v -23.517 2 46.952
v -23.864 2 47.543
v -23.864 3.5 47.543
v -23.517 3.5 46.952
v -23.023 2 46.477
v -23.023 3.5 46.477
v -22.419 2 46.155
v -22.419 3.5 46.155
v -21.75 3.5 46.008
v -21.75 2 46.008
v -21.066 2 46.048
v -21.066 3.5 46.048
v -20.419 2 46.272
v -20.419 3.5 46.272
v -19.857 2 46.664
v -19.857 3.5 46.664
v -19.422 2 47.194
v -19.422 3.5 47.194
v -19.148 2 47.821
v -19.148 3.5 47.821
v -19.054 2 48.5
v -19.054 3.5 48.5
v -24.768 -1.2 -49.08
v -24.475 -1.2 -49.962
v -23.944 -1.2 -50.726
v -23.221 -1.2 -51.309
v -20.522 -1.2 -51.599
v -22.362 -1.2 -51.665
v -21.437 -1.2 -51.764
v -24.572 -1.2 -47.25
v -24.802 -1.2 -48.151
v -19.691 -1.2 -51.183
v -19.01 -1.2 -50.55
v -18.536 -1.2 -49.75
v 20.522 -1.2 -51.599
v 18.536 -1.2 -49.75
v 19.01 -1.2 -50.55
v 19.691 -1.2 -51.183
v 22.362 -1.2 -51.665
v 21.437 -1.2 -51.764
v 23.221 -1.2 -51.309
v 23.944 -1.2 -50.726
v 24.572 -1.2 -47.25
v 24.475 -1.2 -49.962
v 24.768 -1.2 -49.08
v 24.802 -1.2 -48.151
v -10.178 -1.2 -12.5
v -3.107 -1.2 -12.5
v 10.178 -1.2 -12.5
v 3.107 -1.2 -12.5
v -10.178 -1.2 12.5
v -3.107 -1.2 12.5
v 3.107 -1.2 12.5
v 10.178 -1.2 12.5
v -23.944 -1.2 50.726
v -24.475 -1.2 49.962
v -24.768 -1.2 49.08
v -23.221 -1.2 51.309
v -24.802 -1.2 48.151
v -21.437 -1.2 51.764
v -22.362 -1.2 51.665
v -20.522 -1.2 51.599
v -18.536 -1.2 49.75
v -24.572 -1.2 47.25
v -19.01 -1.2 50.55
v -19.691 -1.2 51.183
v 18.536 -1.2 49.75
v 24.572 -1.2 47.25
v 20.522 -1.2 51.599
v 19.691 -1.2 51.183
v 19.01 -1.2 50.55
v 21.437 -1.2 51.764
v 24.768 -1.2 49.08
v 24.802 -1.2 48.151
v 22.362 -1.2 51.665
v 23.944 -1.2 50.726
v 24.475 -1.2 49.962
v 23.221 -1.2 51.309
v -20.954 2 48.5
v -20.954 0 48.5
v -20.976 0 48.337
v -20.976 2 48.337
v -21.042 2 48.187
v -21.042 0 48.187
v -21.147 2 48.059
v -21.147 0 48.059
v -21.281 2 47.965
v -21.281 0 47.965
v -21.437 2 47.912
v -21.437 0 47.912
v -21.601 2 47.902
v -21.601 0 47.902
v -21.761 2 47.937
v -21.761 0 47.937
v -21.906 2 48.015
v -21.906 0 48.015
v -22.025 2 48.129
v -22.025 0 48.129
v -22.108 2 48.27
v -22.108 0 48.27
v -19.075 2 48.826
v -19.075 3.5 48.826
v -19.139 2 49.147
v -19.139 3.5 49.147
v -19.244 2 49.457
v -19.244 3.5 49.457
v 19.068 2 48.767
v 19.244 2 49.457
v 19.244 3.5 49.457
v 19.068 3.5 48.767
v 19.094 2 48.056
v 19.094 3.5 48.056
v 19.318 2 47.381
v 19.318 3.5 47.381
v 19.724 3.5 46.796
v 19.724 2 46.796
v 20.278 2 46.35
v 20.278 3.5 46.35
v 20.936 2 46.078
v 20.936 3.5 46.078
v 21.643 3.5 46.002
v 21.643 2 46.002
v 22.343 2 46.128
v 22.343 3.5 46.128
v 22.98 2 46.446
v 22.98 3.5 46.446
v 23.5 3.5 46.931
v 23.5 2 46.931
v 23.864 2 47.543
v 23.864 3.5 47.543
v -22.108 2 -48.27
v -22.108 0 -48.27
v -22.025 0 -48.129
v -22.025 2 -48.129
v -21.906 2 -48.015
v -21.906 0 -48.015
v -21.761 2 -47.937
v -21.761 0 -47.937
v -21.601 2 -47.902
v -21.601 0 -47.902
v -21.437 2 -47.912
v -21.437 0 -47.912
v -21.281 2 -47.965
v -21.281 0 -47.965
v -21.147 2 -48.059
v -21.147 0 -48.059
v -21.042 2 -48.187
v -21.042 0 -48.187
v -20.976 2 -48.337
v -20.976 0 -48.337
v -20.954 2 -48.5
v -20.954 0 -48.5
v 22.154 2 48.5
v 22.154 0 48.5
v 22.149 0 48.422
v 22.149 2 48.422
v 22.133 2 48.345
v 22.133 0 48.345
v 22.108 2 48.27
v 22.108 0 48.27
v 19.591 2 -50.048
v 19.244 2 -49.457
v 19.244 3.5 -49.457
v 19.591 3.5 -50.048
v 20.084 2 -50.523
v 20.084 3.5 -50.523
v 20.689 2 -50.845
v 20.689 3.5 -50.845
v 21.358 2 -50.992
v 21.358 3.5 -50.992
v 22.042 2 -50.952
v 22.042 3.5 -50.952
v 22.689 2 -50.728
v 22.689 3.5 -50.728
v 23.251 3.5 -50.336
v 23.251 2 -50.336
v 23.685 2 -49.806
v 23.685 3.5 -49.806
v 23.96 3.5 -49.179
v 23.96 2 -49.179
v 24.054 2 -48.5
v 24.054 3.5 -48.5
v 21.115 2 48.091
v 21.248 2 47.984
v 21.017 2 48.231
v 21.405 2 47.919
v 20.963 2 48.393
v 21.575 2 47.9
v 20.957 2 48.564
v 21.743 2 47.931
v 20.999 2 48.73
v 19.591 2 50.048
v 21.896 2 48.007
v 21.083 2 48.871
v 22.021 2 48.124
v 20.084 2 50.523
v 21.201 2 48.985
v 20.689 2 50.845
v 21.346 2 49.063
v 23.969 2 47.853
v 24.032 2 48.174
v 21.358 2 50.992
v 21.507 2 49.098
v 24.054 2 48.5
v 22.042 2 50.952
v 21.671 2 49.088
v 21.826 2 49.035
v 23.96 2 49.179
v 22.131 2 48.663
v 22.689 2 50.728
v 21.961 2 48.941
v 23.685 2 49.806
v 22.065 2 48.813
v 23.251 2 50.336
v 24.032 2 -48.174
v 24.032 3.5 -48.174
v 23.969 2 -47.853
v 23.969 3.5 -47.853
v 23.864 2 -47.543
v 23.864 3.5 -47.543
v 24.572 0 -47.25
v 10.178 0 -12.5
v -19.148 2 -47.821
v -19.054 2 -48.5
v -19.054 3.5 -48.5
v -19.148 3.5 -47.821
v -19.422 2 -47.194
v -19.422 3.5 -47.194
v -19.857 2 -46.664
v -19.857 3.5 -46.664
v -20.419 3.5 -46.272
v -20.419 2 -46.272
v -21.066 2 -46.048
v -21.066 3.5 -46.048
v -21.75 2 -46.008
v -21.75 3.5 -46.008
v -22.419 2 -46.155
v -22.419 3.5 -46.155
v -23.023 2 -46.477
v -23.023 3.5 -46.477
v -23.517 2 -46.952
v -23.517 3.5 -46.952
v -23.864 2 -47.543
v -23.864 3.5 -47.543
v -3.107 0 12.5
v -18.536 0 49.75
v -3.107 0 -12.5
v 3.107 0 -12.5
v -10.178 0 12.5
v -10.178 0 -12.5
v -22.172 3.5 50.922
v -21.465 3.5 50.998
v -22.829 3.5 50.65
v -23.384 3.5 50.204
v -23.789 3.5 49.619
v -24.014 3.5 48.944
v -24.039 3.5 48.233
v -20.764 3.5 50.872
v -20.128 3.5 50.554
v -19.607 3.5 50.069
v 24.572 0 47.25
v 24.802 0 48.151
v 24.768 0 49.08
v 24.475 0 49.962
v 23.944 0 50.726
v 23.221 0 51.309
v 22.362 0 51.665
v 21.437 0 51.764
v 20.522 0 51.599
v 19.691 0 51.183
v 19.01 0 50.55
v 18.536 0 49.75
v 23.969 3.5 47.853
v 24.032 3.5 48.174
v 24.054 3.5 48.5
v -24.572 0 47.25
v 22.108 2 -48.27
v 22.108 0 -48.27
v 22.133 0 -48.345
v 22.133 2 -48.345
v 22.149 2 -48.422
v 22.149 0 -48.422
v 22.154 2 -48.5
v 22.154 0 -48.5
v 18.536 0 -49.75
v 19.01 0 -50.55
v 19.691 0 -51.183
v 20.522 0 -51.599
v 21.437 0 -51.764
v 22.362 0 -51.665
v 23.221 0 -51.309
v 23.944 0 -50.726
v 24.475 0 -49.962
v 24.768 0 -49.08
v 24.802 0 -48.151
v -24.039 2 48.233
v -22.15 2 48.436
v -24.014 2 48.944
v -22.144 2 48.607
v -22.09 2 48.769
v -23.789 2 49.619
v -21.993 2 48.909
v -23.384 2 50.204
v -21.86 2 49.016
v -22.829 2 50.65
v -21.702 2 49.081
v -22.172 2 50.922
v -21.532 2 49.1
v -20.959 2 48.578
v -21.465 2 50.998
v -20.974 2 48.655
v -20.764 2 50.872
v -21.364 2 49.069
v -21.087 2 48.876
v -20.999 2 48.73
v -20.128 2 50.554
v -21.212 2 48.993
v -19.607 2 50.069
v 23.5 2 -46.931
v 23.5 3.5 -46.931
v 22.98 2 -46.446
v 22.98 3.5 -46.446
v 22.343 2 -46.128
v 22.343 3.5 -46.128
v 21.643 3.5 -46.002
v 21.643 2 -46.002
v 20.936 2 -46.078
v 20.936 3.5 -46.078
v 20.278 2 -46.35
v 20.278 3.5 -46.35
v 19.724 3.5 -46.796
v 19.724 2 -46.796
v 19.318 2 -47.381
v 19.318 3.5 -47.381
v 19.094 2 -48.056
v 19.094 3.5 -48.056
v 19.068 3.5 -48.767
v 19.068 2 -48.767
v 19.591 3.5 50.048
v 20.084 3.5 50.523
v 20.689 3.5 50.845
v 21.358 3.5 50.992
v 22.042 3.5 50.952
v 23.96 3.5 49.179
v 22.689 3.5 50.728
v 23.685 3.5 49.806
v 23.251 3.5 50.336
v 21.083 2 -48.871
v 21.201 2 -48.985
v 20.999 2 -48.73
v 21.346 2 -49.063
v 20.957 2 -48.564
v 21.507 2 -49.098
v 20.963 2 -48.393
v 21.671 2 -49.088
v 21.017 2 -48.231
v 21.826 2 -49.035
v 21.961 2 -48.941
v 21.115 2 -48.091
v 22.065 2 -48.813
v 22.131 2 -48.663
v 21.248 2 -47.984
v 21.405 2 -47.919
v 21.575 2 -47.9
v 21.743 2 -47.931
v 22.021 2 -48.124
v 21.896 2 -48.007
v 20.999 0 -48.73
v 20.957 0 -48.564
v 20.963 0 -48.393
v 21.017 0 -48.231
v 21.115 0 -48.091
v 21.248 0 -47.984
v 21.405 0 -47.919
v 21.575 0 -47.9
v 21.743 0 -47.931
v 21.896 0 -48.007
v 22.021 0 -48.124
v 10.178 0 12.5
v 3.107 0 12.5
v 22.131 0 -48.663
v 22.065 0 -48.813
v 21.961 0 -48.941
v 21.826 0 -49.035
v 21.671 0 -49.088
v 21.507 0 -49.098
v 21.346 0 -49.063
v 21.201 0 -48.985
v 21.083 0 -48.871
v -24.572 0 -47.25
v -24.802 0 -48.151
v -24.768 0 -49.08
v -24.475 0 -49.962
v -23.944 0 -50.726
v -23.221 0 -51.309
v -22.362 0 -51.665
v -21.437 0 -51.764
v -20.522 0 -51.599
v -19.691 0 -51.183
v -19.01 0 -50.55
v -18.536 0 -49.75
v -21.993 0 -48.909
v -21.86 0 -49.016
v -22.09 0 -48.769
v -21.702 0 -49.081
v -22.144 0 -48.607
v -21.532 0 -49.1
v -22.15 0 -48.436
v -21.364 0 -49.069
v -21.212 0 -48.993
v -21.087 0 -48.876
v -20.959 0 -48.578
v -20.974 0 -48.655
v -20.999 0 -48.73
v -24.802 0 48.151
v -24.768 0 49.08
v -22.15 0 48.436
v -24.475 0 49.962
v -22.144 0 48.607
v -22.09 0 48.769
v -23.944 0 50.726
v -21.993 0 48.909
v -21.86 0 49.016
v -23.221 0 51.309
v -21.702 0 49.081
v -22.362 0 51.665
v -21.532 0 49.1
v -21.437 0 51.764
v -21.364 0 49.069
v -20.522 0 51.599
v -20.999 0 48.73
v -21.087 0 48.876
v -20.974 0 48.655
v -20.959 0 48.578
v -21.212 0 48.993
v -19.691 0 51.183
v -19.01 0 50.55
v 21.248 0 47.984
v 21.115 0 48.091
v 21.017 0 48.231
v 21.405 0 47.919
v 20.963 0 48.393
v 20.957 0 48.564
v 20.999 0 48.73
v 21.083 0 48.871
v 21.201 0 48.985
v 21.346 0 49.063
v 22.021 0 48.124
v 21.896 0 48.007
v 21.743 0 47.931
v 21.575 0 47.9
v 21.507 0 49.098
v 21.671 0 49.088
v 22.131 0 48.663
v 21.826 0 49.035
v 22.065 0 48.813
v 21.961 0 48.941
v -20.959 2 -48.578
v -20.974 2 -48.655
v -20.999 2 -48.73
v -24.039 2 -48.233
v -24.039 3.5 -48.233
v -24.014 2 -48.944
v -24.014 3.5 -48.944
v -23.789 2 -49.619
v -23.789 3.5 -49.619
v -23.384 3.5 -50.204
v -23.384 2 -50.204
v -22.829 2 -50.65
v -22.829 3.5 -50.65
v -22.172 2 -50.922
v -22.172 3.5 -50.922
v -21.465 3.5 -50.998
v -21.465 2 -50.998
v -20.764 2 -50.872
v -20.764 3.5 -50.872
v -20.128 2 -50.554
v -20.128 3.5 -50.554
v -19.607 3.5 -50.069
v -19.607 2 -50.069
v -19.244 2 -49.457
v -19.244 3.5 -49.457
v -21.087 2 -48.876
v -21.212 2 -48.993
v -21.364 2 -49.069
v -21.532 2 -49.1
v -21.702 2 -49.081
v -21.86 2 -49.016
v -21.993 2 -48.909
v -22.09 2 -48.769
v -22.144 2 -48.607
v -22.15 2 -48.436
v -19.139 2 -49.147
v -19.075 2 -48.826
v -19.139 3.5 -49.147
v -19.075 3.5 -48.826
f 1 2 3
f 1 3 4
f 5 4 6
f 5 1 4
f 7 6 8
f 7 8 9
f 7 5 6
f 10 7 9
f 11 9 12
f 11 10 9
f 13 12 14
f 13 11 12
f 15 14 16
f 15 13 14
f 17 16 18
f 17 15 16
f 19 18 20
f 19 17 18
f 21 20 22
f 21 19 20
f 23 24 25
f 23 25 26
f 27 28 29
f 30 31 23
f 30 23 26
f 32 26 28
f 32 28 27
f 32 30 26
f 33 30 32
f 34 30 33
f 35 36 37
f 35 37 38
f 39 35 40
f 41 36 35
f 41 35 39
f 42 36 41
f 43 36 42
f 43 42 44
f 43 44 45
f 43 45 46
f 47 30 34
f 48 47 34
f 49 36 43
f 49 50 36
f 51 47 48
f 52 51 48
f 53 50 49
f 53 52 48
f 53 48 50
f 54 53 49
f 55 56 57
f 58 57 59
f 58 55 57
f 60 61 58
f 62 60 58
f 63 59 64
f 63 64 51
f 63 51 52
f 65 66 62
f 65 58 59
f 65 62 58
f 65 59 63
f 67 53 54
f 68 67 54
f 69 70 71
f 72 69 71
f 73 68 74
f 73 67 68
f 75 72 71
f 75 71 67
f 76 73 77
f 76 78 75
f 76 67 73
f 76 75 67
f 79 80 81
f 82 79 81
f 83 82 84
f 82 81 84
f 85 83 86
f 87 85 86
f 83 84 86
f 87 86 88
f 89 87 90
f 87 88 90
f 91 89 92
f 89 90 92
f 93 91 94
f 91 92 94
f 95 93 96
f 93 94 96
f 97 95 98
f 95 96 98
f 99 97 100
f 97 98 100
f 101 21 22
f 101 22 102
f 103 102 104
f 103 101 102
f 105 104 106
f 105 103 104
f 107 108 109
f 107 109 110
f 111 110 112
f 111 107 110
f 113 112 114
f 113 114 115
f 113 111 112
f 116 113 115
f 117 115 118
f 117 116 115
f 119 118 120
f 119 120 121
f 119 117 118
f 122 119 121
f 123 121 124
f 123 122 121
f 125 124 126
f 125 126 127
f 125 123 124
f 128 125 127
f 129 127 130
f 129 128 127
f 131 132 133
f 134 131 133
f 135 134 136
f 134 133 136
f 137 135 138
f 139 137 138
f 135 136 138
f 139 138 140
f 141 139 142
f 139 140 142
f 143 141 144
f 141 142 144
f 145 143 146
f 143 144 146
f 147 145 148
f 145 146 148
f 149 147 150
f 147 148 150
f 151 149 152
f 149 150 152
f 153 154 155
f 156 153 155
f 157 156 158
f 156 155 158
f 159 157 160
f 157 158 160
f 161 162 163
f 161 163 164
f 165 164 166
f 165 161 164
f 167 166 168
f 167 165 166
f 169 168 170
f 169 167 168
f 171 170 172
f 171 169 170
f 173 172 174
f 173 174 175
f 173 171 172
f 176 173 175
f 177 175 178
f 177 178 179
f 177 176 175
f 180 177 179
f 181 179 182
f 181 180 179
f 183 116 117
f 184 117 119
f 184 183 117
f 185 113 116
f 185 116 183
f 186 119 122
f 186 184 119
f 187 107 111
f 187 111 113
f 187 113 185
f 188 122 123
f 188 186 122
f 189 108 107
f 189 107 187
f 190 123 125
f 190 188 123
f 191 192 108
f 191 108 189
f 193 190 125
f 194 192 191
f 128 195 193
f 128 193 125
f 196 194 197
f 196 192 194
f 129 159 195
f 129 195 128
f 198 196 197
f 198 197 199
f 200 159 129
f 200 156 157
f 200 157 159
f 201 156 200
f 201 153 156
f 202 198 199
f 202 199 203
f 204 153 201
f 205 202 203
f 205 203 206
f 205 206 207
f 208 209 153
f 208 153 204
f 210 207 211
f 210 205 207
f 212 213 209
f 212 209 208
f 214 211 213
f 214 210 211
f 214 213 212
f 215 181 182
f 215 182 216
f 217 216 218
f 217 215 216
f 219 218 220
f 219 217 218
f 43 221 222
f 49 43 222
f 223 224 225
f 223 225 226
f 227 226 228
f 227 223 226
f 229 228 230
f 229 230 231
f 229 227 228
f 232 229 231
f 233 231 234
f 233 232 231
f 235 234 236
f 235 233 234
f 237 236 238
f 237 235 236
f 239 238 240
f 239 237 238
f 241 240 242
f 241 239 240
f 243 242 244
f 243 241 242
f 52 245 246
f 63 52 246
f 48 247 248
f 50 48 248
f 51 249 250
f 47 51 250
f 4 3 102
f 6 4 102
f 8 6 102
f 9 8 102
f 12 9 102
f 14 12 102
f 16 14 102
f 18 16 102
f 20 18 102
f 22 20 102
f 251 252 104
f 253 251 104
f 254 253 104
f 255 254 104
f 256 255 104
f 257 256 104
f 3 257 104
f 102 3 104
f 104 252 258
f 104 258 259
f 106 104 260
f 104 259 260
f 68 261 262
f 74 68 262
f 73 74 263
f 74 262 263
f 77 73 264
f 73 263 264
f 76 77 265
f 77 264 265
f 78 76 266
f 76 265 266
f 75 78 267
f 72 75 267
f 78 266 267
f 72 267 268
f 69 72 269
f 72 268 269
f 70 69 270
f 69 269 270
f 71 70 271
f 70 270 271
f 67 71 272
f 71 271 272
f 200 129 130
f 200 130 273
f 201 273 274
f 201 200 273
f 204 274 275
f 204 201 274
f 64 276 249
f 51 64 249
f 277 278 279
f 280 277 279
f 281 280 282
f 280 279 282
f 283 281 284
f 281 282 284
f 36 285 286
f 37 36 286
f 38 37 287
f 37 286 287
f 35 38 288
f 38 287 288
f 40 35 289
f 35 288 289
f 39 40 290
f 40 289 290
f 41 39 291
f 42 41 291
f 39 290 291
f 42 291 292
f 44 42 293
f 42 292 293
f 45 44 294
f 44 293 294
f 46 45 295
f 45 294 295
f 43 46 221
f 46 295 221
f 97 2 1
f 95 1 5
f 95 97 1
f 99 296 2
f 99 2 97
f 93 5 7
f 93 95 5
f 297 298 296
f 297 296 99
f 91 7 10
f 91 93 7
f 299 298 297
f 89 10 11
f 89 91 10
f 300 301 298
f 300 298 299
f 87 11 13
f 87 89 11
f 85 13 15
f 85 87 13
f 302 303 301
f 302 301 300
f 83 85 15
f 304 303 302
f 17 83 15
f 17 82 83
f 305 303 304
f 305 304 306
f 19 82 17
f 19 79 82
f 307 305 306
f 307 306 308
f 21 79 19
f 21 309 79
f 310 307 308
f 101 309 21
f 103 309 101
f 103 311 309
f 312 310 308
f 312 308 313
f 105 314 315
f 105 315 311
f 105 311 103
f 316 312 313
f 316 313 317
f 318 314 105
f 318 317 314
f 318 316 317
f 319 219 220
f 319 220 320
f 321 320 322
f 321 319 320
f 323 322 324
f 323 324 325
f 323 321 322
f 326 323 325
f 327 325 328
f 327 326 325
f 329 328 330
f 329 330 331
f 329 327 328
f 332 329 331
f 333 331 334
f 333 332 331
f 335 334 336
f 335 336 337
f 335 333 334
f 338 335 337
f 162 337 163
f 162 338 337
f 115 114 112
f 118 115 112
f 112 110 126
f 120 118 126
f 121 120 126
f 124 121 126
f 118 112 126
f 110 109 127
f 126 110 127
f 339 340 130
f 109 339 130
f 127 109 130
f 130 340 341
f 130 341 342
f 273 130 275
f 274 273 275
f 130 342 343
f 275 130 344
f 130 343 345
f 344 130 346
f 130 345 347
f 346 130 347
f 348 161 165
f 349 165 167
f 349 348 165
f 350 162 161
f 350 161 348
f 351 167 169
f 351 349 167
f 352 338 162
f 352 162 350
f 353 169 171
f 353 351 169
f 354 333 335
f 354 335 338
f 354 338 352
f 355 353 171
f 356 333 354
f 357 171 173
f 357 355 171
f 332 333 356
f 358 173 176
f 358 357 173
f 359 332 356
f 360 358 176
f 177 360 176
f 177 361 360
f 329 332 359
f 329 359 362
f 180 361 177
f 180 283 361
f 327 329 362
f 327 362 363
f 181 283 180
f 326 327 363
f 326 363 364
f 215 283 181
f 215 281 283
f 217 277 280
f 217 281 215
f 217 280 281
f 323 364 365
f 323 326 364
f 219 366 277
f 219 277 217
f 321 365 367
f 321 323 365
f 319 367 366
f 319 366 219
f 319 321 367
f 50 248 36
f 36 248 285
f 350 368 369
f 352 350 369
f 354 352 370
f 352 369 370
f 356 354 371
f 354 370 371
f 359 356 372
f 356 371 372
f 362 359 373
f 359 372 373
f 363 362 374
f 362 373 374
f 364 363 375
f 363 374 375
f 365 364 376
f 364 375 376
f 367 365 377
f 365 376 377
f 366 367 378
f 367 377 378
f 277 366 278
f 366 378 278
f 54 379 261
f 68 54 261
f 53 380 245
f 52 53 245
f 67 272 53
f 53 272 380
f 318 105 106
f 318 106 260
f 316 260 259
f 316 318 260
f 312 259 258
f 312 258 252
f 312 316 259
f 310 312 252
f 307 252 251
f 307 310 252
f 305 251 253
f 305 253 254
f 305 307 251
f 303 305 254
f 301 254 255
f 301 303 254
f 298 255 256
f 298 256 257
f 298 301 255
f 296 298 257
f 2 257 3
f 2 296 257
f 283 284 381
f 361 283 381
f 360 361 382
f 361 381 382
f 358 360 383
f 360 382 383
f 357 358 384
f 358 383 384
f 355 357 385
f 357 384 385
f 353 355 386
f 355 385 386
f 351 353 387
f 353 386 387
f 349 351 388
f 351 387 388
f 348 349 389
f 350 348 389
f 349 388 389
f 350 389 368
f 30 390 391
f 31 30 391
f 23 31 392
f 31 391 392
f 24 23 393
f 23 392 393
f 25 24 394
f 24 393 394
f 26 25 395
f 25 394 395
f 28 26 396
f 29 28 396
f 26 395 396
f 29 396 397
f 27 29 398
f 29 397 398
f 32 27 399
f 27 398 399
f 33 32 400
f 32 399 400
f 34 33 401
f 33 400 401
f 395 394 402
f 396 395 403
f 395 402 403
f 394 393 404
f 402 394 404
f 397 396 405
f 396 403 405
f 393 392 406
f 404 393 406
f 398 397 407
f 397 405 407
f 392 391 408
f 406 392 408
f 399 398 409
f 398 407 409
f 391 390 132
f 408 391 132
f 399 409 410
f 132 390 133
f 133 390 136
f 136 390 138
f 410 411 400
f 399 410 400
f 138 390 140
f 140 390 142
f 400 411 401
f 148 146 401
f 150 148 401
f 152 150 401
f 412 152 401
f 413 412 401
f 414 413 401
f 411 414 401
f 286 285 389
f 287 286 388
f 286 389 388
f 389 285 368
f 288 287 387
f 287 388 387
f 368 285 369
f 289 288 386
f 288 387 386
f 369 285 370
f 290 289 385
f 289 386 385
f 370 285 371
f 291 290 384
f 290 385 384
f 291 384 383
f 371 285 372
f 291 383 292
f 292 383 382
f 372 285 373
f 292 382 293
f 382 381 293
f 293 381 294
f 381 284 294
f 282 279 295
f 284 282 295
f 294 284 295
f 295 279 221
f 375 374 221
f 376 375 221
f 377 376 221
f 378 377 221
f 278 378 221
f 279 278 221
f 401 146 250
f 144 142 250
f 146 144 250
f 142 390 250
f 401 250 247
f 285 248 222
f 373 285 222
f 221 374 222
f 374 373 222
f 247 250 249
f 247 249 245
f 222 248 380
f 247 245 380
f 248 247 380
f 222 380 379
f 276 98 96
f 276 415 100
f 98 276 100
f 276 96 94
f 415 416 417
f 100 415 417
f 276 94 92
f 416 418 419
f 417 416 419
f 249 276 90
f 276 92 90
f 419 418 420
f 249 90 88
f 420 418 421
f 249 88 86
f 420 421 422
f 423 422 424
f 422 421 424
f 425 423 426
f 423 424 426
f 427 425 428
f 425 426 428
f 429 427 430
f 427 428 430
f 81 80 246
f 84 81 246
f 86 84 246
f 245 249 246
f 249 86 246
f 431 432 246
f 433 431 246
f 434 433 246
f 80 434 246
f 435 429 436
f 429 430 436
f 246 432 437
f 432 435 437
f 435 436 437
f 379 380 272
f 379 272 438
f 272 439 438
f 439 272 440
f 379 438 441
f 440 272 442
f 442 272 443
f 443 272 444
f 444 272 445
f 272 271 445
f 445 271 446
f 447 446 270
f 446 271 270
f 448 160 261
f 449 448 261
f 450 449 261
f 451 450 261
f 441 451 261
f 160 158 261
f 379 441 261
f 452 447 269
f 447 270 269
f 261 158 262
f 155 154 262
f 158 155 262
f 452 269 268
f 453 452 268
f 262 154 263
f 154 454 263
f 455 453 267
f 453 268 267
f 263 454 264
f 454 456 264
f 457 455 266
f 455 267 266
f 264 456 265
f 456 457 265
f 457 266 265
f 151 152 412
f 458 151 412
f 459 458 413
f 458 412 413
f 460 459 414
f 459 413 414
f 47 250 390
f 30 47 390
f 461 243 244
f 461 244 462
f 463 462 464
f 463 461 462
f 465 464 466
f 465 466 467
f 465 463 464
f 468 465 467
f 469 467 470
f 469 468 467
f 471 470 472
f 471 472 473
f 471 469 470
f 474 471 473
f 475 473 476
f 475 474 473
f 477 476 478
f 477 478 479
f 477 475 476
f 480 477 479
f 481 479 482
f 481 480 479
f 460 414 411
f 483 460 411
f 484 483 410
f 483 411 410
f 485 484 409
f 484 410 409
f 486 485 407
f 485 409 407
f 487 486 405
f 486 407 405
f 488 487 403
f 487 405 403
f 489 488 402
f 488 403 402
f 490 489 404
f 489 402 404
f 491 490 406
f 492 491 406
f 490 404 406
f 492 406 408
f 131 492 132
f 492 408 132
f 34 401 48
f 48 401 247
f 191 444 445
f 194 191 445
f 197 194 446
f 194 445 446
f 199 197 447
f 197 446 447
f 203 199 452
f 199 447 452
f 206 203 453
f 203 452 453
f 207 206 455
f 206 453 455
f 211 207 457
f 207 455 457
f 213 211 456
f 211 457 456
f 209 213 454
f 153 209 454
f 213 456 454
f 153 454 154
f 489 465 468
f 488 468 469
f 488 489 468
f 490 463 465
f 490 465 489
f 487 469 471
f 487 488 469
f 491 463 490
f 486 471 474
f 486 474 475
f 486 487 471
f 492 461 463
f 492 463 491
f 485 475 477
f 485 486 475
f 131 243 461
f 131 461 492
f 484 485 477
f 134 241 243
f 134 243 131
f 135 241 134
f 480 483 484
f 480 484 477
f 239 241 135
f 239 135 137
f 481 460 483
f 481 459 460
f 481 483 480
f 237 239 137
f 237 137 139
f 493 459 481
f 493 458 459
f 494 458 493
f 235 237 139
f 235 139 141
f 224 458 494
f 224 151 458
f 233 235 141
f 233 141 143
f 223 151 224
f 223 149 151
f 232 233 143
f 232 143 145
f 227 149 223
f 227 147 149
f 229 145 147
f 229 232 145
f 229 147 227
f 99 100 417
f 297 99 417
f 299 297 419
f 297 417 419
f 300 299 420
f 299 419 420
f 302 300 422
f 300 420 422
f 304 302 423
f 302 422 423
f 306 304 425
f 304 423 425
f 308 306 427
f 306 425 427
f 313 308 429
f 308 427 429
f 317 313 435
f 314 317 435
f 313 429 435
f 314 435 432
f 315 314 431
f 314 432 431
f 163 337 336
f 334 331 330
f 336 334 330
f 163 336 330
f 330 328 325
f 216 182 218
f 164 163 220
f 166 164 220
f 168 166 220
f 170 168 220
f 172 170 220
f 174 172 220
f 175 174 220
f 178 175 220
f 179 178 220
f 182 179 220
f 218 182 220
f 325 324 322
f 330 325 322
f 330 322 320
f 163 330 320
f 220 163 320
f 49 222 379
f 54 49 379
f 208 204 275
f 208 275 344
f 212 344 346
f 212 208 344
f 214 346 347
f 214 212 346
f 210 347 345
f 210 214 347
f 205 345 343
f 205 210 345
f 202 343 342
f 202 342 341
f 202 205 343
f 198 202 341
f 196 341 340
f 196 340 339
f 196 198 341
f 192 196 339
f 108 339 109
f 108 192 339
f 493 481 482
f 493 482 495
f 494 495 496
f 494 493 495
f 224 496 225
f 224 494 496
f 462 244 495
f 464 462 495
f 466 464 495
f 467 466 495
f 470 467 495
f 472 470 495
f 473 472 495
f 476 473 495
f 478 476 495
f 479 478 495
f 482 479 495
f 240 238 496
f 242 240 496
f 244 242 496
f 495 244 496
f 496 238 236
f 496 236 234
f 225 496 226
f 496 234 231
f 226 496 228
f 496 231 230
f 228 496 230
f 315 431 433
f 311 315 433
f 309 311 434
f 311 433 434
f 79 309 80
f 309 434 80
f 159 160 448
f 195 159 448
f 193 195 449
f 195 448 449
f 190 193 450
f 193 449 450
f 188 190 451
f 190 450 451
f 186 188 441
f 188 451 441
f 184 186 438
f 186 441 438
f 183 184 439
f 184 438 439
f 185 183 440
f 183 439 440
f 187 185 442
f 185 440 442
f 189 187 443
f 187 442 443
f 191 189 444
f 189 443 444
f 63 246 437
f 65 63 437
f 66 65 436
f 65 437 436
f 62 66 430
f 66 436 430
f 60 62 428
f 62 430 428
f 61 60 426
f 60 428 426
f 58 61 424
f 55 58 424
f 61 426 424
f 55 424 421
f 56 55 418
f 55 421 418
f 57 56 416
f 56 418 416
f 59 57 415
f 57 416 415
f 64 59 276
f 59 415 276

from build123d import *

# Parameters (mm, degrees)
F1_DEPTH = 1.2
F2_DEPTH = 3.5
F3_DEPTH = 2


with BuildPart() as f1:
    # F0 (on Front) → F1 (new body)
    with BuildSketch(Plane.XZ):
        with BuildLine():
            ThreePointArc((-19.2441250379, 49.4567085809), (-22.5105324501, 50.8096988313), (-23.8635227004, 47.5432914191))
            Line((-23.8635227004, 47.5432914191), (-22.1081515887, 48.2703899406))
            ThreePointArc((-22.1081515887, 48.2703899406), (-21.7834339286, 49.0543277195), (-20.9994961497, 48.7296100594))
            Line((-20.9994961497, 48.7296100594), (-19.2441250379, 49.4567085809))
        make_face()
        with BuildLine():
            Line((-22.1081515887, 48.2703899406), (-23.8635227004, 47.5432914191))
            ThreePointArc((-23.8635227004, 47.5432914191), (-21.0660980641, 46.048036799), (-19.0538238692, 48.5))
            ThreePointArc((-19.0538238692, 48.5), (-19.1018606682, 48.987725805), (-19.2441250379, 49.4567085809))
            Line((-19.2441250379, 49.4567085809), (-20.9994961497, 48.7296100594))
            ThreePointArc((-20.9994961497, 48.7296100594), (-20.9653527009, 48.6170541932), (-20.9538238692, 48.5))
            ThreePointArc((-20.9538238692, 48.5), (-21.436769676, 47.9115288318), (-22.1081515887, 48.2703899406))
        make_face()
        with BuildLine():
            Line((-20.9994961497, 48.7296100594), (-22.1081515887, 48.2703899406))
            ThreePointArc((-22.1081515887, 48.2703899406), (-21.436769676, 47.9115288318), (-20.9538238692, 48.5))
            ThreePointArc((-20.9538238692, 48.5), (-20.9653527009, 48.6170541932), (-20.9994961497, 48.7296100594))
        make_face()
        with BuildLine():
            ThreePointArc((-20.9994961497, 48.7296100594), (-21.7834339286, 49.0543277195), (-22.1081515887, 48.2703899406))
            Line((-22.1081515887, 48.2703899406), (-20.9994961497, 48.7296100594))
        make_face()
        with BuildLine():
            ThreePointArc((22.1538238692, 48.5), (21.6708780624, 49.0884711682), (20.9994961497, 48.7296100594))
            Line((20.9994961497, 48.7296100594), (22.1081515887, 48.2703899406))
            ThreePointArc((22.1081515887, 48.2703899406), (22.1422950374, 48.3829458068), (22.1538238692, 48.5))
        make_face()
        with BuildLine():
            ThreePointArc((24.0538238692, 48.5), (22.0415496742, 50.951963201), (19.2441250379, 49.4567085809))
            Line((19.2441250379, 49.4567085809), (20.9994961497, 48.7296100594))
            ThreePointArc((20.9994961497, 48.7296100594), (21.6708780624, 49.0884711682), (22.1538238692, 48.5))
            ThreePointArc((22.1538238692, 48.5), (22.1422950374, 48.3829458068), (22.1081515887, 48.2703899406))
            Line((22.1081515887, 48.2703899406), (23.8635227004, 47.5432914191))
            ThreePointArc((23.8635227004, 47.5432914191), (24.0057870702, 48.012274195), (24.0538238692, 48.5))
        make_face()
        with BuildLine():
            Line((20.9994961497, 48.7296100594), (19.2441250379, 49.4567085809))
            ThreePointArc((19.2441250379, 49.4567085809), (20.5971152882, 46.1903011687), (23.8635227004, 47.5432914191))
            Line((23.8635227004, 47.5432914191), (22.1081515887, 48.2703899406))
            ThreePointArc((22.1081515887, 48.2703899406), (21.3242138097, 47.9456722805), (20.9994961497, 48.7296100594))
        make_face()
        with BuildLine():
            Line((22.1081515887, 48.2703899406), (20.9994961497, 48.7296100594))
            ThreePointArc((20.9994961497, 48.7296100594), (21.3242138097, 47.9456722805), (22.1081515887, 48.2703899406))
        make_face()
        with BuildLine():
            Line((-22.1081515887, -48.2703899406), (-23.8635227004, -47.5432914191))
            ThreePointArc((-23.8635227004, -47.5432914191), (-22.5105324501, -50.8096988313), (-19.2441250379, -49.4567085809))
            Line((-19.2441250379, -49.4567085809), (-20.9994961497, -48.7296100594))
            ThreePointArc((-20.9994961497, -48.7296100594), (-21.7834339286, -49.0543277195), (-22.1081515887, -48.2703899406))
        make_face()
        with BuildLine():
            Line((-20.9994961497, -48.7296100594), (-22.1081515887, -48.2703899406))
            ThreePointArc((-22.1081515887, -48.2703899406), (-21.7834339286, -49.0543277195), (-20.9994961497, -48.7296100594))
        make_face()
        with BuildLine():
            ThreePointArc((-20.9538238692, -48.5), (-21.436769676, -47.9115288318), (-22.1081515887, -48.2703899406))
            Line((-22.1081515887, -48.2703899406), (-20.9994961497, -48.7296100594))
            ThreePointArc((-20.9994961497, -48.7296100594), (-20.9653527009, -48.6170541932), (-20.9538238692, -48.5))
        make_face()
        with BuildLine():
            ThreePointArc((-19.0538238692, -48.5), (-21.0660980641, -46.048036799), (-23.8635227004, -47.5432914191))
            Line((-23.8635227004, -47.5432914191), (-22.1081515887, -48.2703899406))
            ThreePointArc((-22.1081515887, -48.2703899406), (-21.436769676, -47.9115288318), (-20.9538238692, -48.5))
            ThreePointArc((-20.9538238692, -48.5), (-20.9653527009, -48.6170541932), (-20.9994961497, -48.7296100594))
            Line((-20.9994961497, -48.7296100594), (-19.2441250379, -49.4567085809))
            ThreePointArc((-19.2441250379, -49.4567085809), (-19.1018606682, -48.987725805), (-19.0538238692, -48.5))
        make_face()
        with BuildLine():
            ThreePointArc((23.8635227004, -47.5432914191), (20.5971152882, -46.1903011687), (19.2441250379, -49.4567085809))
            Line((19.2441250379, -49.4567085809), (20.9994961497, -48.7296100594))
            ThreePointArc((20.9994961497, -48.7296100594), (21.3242138097, -47.9456722805), (22.1081515887, -48.2703899406))
            Line((22.1081515887, -48.2703899406), (23.8635227004, -47.5432914191))
        make_face()
        with BuildLine():
            Line((20.9994961497, -48.7296100594), (19.2441250379, -49.4567085809))
            ThreePointArc((19.2441250379, -49.4567085809), (22.0415496742, -50.951963201), (24.0538238692, -48.5))
            ThreePointArc((24.0538238692, -48.5), (24.0057870702, -48.012274195), (23.8635227004, -47.5432914191))
            Line((23.8635227004, -47.5432914191), (22.1081515887, -48.2703899406))
            ThreePointArc((22.1081515887, -48.2703899406), (22.1422950374, -48.3829458068), (22.1538238692, -48.5))
            ThreePointArc((22.1538238692, -48.5), (21.6708780624, -49.0884711682), (20.9994961497, -48.7296100594))
        make_face()
        with BuildLine():
            Line((22.1081515887, -48.2703899406), (20.9994961497, -48.7296100594))
            ThreePointArc((20.9994961497, -48.7296100594), (21.6708780624, -49.0884711682), (22.1538238692, -48.5))
            ThreePointArc((22.1538238692, -48.5), (22.1422950374, -48.3829458068), (22.1081515887, -48.2703899406))
        make_face()
        with BuildLine():
            ThreePointArc((22.1081515887, -48.2703899406), (21.3242138097, -47.9456722805), (20.9994961497, -48.7296100594))
            Line((20.9994961497, -48.7296100594), (22.1081515887, -48.2703899406))
        make_face()
        Polygon((-10.1776695297, 12.5), (-5, 0), (-10.1776695297, -12.5), (-3.1066017178, -12.5), (0, -5), (3.1066017178, -12.5), (10.1776695297, -12.5), (5, 0), (10.1776695297, 12.5), (3.1066017178, 12.5), (0, 5), (-3.1066017178, 12.5), align=None)
        with BuildLine():
            Line((-24.5715908221, 47.25), (-10.1776695297, 12.5))
            Line((-10.1776695297, 12.5), (-3.1066017178, 12.5))
            Line((-3.1066017178, 12.5), (-18.5360569162, 49.75))
            Line((-18.5360569162, 49.75), (-19.2441250379, 49.4567085809))
            ThreePointArc((-19.2441250379, 49.4567085809), (-19.1018606682, 48.987725805), (-19.0538238692, 48.5))
            ThreePointArc((-19.0538238692, 48.5), (-21.0660980641, 46.048036799), (-23.8635227004, 47.5432914191))
            Line((-23.8635227004, 47.5432914191), (-24.5715908221, 47.25))
        make_face()
        with BuildLine():
            ThreePointArc((-18.5360569162, 49.75), (-22.8038238692, 51.517766953), (-24.5715908221, 47.25))
            Line((-24.5715908221, 47.25), (-23.8635227004, 47.5432914191))
            ThreePointArc((-23.8635227004, 47.5432914191), (-22.5105324501, 50.8096988313), (-19.2441250379, 49.4567085809))
            Line((-19.2441250379, 49.4567085809), (-18.5360569162, 49.75))
        make_face()
        with BuildLine():
            ThreePointArc((24.5715908221, 47.25), (22.8038238692, 51.517766953), (18.5360569162, 49.75))
            Line((18.5360569162, 49.75), (19.2441250379, 49.4567085809))
            ThreePointArc((19.2441250379, 49.4567085809), (22.0415496742, 50.951963201), (24.0538238692, 48.5))
            ThreePointArc((24.0538238692, 48.5), (24.0057870702, 48.012274195), (23.8635227004, 47.5432914191))
            Line((23.8635227004, 47.5432914191), (24.5715908221, 47.25))
        make_face()
        with BuildLine():
            Line((-23.8635227004, -47.5432914191), (-24.5715908221, -47.25))
            ThreePointArc((-24.5715908221, -47.25), (-22.8038238692, -51.517766953), (-18.5360569162, -49.75))
            Line((-18.5360569162, -49.75), (-19.2441250379, -49.4567085809))
            ThreePointArc((-19.2441250379, -49.4567085809), (-22.5105324501, -50.8096988313), (-23.8635227004, -47.5432914191))
        make_face()
        with BuildLine():
            Line((19.2441250379, -49.4567085809), (18.5360569162, -49.75))
            ThreePointArc((18.5360569162, -49.75), (22.8038238692, -51.517766953), (24.5715908221, -47.25))
            Line((24.5715908221, -47.25), (23.8635227004, -47.5432914191))
            ThreePointArc((23.8635227004, -47.5432914191), (24.0057870702, -48.012274195), (24.0538238692, -48.5))
            ThreePointArc((24.0538238692, -48.5), (22.0415496742, -50.951963201), (19.2441250379, -49.4567085809))
        make_face()
        Polygon((-10.1776695297, -12.5), (-5, 0), (-10.1776695297, 12.5), align=None)
        Polygon((3.1066017178, 12.5), (-3.1066017178, 12.5), (0, 5), align=None)
        with BuildLine():
            Line((18.5360569162, 49.75), (3.1066017178, 12.5))
            Line((3.1066017178, 12.5), (10.1776695297, 12.5))
            Line((10.1776695297, 12.5), (24.5715908221, 47.25))
            Line((24.5715908221, 47.25), (23.8635227004, 47.5432914191))
            ThreePointArc((23.8635227004, 47.5432914191), (20.5971152882, 46.1903011687), (19.2441250379, 49.4567085809))
            Line((19.2441250379, 49.4567085809), (18.5360569162, 49.75))
        make_face()
        Polygon((10.1776695297, -12.5), (10.1776695297, 12.5), (5, 0), align=None)
        Polygon((0, -5), (-3.1066017178, -12.5), (3.1066017178, -12.5), align=None)
        with BuildLine():
            Line((10.1776695297, -12.5), (3.1066017178, -12.5))
            Line((3.1066017178, -12.5), (18.5360569162, -49.75))
            Line((18.5360569162, -49.75), (19.2441250379, -49.4567085809))
            ThreePointArc((19.2441250379, -49.4567085809), (20.5971152882, -46.1903011687), (23.8635227004, -47.5432914191))
            Line((23.8635227004, -47.5432914191), (24.5715908221, -47.25))
            Line((24.5715908221, -47.25), (10.1776695297, -12.5))
        make_face()
        with BuildLine():
            Line((-3.1066017178, -12.5), (-10.1776695297, -12.5))
            Line((-10.1776695297, -12.5), (-24.5715908221, -47.25))
            Line((-24.5715908221, -47.25), (-23.8635227004, -47.5432914191))
            ThreePointArc((-23.8635227004, -47.5432914191), (-21.0660980641, -46.048036799), (-19.0538238692, -48.5))
            ThreePointArc((-19.0538238692, -48.5), (-19.1018606682, -48.987725805), (-19.2441250379, -49.4567085809))
            Line((-19.2441250379, -49.4567085809), (-18.5360569162, -49.75))
            Line((-18.5360569162, -49.75), (-3.1066017178, -12.5))
        make_face()
    extrude(amount=F1_DEPTH)

    # F0 (on Front) → F2 (join)
    with BuildSketch(Plane.XZ):
        with BuildLine():
            ThreePointArc((24.0538238692, 48.5), (22.0415496742, 50.951963201), (19.2441250379, 49.4567085809))
            Line((19.2441250379, 49.4567085809), (20.9994961497, 48.7296100594))
            ThreePointArc((20.9994961497, 48.7296100594), (21.6708780624, 49.0884711682), (22.1538238692, 48.5))
            ThreePointArc((22.1538238692, 48.5), (22.1422950374, 48.3829458068), (22.1081515887, 48.2703899406))
            Line((22.1081515887, 48.2703899406), (23.8635227004, 47.5432914191))
            ThreePointArc((23.8635227004, 47.5432914191), (24.0057870702, 48.012274195), (24.0538238692, 48.5))
        make_face()
        with BuildLine():
            Line((20.9994961497, 48.7296100594), (19.2441250379, 49.4567085809))
            ThreePointArc((19.2441250379, 49.4567085809), (20.5971152882, 46.1903011687), (23.8635227004, 47.5432914191))
            Line((23.8635227004, 47.5432914191), (22.1081515887, 48.2703899406))
            ThreePointArc((22.1081515887, 48.2703899406), (21.3242138097, 47.9456722805), (20.9994961497, 48.7296100594))
        make_face()
        with BuildLine():
            ThreePointArc((-19.2441250379, 49.4567085809), (-22.5105324501, 50.8096988313), (-23.8635227004, 47.5432914191))
            Line((-23.8635227004, 47.5432914191), (-22.1081515887, 48.2703899406))
            ThreePointArc((-22.1081515887, 48.2703899406), (-21.7834339286, 49.0543277195), (-20.9994961497, 48.7296100594))
            Line((-20.9994961497, 48.7296100594), (-19.2441250379, 49.4567085809))
        make_face()
        with BuildLine():
            Line((-22.1081515887, 48.2703899406), (-23.8635227004, 47.5432914191))
            ThreePointArc((-23.8635227004, 47.5432914191), (-21.0660980641, 46.048036799), (-19.0538238692, 48.5))
            ThreePointArc((-19.0538238692, 48.5), (-19.1018606682, 48.987725805), (-19.2441250379, 49.4567085809))
            Line((-19.2441250379, 49.4567085809), (-20.9994961497, 48.7296100594))
            ThreePointArc((-20.9994961497, 48.7296100594), (-20.9653527009, 48.6170541932), (-20.9538238692, 48.5))
            ThreePointArc((-20.9538238692, 48.5), (-21.436769676, 47.9115288318), (-22.1081515887, 48.2703899406))
        make_face()
        with BuildLine():
            ThreePointArc((-19.0538238692, -48.5), (-21.0660980641, -46.048036799), (-23.8635227004, -47.5432914191))
            Line((-23.8635227004, -47.5432914191), (-22.1081515887, -48.2703899406))
            ThreePointArc((-22.1081515887, -48.2703899406), (-21.436769676, -47.9115288318), (-20.9538238692, -48.5))
            ThreePointArc((-20.9538238692, -48.5), (-20.9653527009, -48.6170541932), (-20.9994961497, -48.7296100594))
            Line((-20.9994961497, -48.7296100594), (-19.2441250379, -49.4567085809))
            ThreePointArc((-19.2441250379, -49.4567085809), (-19.1018606682, -48.987725805), (-19.0538238692, -48.5))
        make_face()
        with BuildLine():
            Line((-22.1081515887, -48.2703899406), (-23.8635227004, -47.5432914191))
            ThreePointArc((-23.8635227004, -47.5432914191), (-22.5105324501, -50.8096988313), (-19.2441250379, -49.4567085809))
            Line((-19.2441250379, -49.4567085809), (-20.9994961497, -48.7296100594))
            ThreePointArc((-20.9994961497, -48.7296100594), (-21.7834339286, -49.0543277195), (-22.1081515887, -48.2703899406))
        make_face()
        with BuildLine():
            Line((20.9994961497, -48.7296100594), (19.2441250379, -49.4567085809))
            ThreePointArc((19.2441250379, -49.4567085809), (22.0415496742, -50.951963201), (24.0538238692, -48.5))
            ThreePointArc((24.0538238692, -48.5), (24.0057870702, -48.012274195), (23.8635227004, -47.5432914191))
            Line((23.8635227004, -47.5432914191), (22.1081515887, -48.2703899406))
            ThreePointArc((22.1081515887, -48.2703899406), (22.1422950374, -48.3829458068), (22.1538238692, -48.5))
            ThreePointArc((22.1538238692, -48.5), (21.6708780624, -49.0884711682), (20.9994961497, -48.7296100594))
        make_face()
        with BuildLine():
            ThreePointArc((23.8635227004, -47.5432914191), (20.5971152882, -46.1903011687), (19.2441250379, -49.4567085809))
            Line((19.2441250379, -49.4567085809), (20.9994961497, -48.7296100594))
            ThreePointArc((20.9994961497, -48.7296100594), (21.3242138097, -47.9456722805), (22.1081515887, -48.2703899406))
            Line((22.1081515887, -48.2703899406), (23.8635227004, -47.5432914191))
        make_face()
        with BuildLine():
            Line((22.1081515887, -48.2703899406), (20.9994961497, -48.7296100594))
            ThreePointArc((20.9994961497, -48.7296100594), (21.6708780624, -49.0884711682), (22.1538238692, -48.5))
            ThreePointArc((22.1538238692, -48.5), (22.1422950374, -48.3829458068), (22.1081515887, -48.2703899406))
        make_face()
        with BuildLine():
            ThreePointArc((22.1081515887, -48.2703899406), (21.3242138097, -47.9456722805), (20.9994961497, -48.7296100594))
            Line((20.9994961497, -48.7296100594), (22.1081515887, -48.2703899406))
        make_face()
        with BuildLine():
            ThreePointArc((22.1538238692, 48.5), (21.6708780624, 49.0884711682), (20.9994961497, 48.7296100594))
            Line((20.9994961497, 48.7296100594), (22.1081515887, 48.2703899406))
            ThreePointArc((22.1081515887, 48.2703899406), (22.1422950374, 48.3829458068), (22.1538238692, 48.5))
        make_face()
        with BuildLine():
            Line((22.1081515887, 48.2703899406), (20.9994961497, 48.7296100594))
            ThreePointArc((20.9994961497, 48.7296100594), (21.3242138097, 47.9456722805), (22.1081515887, 48.2703899406))
        make_face()
        with BuildLine():
            Line((-20.9994961497, 48.7296100594), (-22.1081515887, 48.2703899406))
            ThreePointArc((-22.1081515887, 48.2703899406), (-21.436769676, 47.9115288318), (-20.9538238692, 48.5))
            ThreePointArc((-20.9538238692, 48.5), (-20.9653527009, 48.6170541932), (-20.9994961497, 48.7296100594))
        make_face()
        with BuildLine():
            ThreePointArc((-20.9994961497, 48.7296100594), (-21.7834339286, 49.0543277195), (-22.1081515887, 48.2703899406))
            Line((-22.1081515887, 48.2703899406), (-20.9994961497, 48.7296100594))
        make_face()
        with BuildLine():
            ThreePointArc((-20.9538238692, -48.5), (-21.436769676, -47.9115288318), (-22.1081515887, -48.2703899406))
            Line((-22.1081515887, -48.2703899406), (-20.9994961497, -48.7296100594))
            ThreePointArc((-20.9994961497, -48.7296100594), (-20.9653527009, -48.6170541932), (-20.9538238692, -48.5))
        make_face()
        with BuildLine():
            Line((-20.9994961497, -48.7296100594), (-22.1081515887, -48.2703899406))
            ThreePointArc((-22.1081515887, -48.2703899406), (-21.7834339286, -49.0543277195), (-20.9994961497, -48.7296100594))
        make_face()
    extrude(amount=-F2_DEPTH)

    # F0 (on Front) → F3 (cut)
    with BuildSketch(Plane.XZ):
        with BuildLine():
            ThreePointArc((-19.2441250379, 49.4567085809), (-22.5105324501, 50.8096988313), (-23.8635227004, 47.5432914191))
            Line((-23.8635227004, 47.5432914191), (-22.1081515887, 48.2703899406))
            ThreePointArc((-22.1081515887, 48.2703899406), (-21.7834339286, 49.0543277195), (-20.9994961497, 48.7296100594))
            Line((-20.9994961497, 48.7296100594), (-19.2441250379, 49.4567085809))
        make_face()
        with BuildLine():
            Line((-22.1081515887, 48.2703899406), (-23.8635227004, 47.5432914191))
            ThreePointArc((-23.8635227004, 47.5432914191), (-21.0660980641, 46.048036799), (-19.0538238692, 48.5))
            ThreePointArc((-19.0538238692, 48.5), (-19.1018606682, 48.987725805), (-19.2441250379, 49.4567085809))
            Line((-19.2441250379, 49.4567085809), (-20.9994961497, 48.7296100594))
            ThreePointArc((-20.9994961497, 48.7296100594), (-20.9653527009, 48.6170541932), (-20.9538238692, 48.5))
            ThreePointArc((-20.9538238692, 48.5), (-21.436769676, 47.9115288318), (-22.1081515887, 48.2703899406))
        make_face()
        with BuildLine():
            ThreePointArc((24.0538238692, 48.5), (22.0415496742, 50.951963201), (19.2441250379, 49.4567085809))
            Line((19.2441250379, 49.4567085809), (20.9994961497, 48.7296100594))
            ThreePointArc((20.9994961497, 48.7296100594), (21.6708780624, 49.0884711682), (22.1538238692, 48.5))
            ThreePointArc((22.1538238692, 48.5), (22.1422950374, 48.3829458068), (22.1081515887, 48.2703899406))
            Line((22.1081515887, 48.2703899406), (23.8635227004, 47.5432914191))
            ThreePointArc((23.8635227004, 47.5432914191), (24.0057870702, 48.012274195), (24.0538238692, 48.5))
        make_face()
        with BuildLine():
            Line((20.9994961497, 48.7296100594), (19.2441250379, 49.4567085809))
            ThreePointArc((19.2441250379, 49.4567085809), (20.5971152882, 46.1903011687), (23.8635227004, 47.5432914191))
            Line((23.8635227004, 47.5432914191), (22.1081515887, 48.2703899406))
            ThreePointArc((22.1081515887, 48.2703899406), (21.3242138097, 47.9456722805), (20.9994961497, 48.7296100594))
        make_face()
        with BuildLine():
            ThreePointArc((23.8635227004, -47.5432914191), (20.5971152882, -46.1903011687), (19.2441250379, -49.4567085809))
            Line((19.2441250379, -49.4567085809), (20.9994961497, -48.7296100594))
            ThreePointArc((20.9994961497, -48.7296100594), (21.3242138097, -47.9456722805), (22.1081515887, -48.2703899406))
            Line((22.1081515887, -48.2703899406), (23.8635227004, -47.5432914191))
        make_face()
        with BuildLine():
            Line((20.9994961497, -48.7296100594), (19.2441250379, -49.4567085809))
            ThreePointArc((19.2441250379, -49.4567085809), (22.0415496742, -50.951963201), (24.0538238692, -48.5))
            ThreePointArc((24.0538238692, -48.5), (24.0057870702, -48.012274195), (23.8635227004, -47.5432914191))
            Line((23.8635227004, -47.5432914191), (22.1081515887, -48.2703899406))
            ThreePointArc((22.1081515887, -48.2703899406), (22.1422950374, -48.3829458068), (22.1538238692, -48.5))
            ThreePointArc((22.1538238692, -48.5), (21.6708780624, -49.0884711682), (20.9994961497, -48.7296100594))
        make_face()
        with BuildLine():
            Line((-22.1081515887, -48.2703899406), (-23.8635227004, -47.5432914191))
            ThreePointArc((-23.8635227004, -47.5432914191), (-22.5105324501, -50.8096988313), (-19.2441250379, -49.4567085809))
            Line((-19.2441250379, -49.4567085809), (-20.9994961497, -48.7296100594))
            ThreePointArc((-20.9994961497, -48.7296100594), (-21.7834339286, -49.0543277195), (-22.1081515887, -48.2703899406))
        make_face()
        with BuildLine():
            ThreePointArc((-19.0538238692, -48.5), (-21.0660980641, -46.048036799), (-23.8635227004, -47.5432914191))
            Line((-23.8635227004, -47.5432914191), (-22.1081515887, -48.2703899406))
            ThreePointArc((-22.1081515887, -48.2703899406), (-21.436769676, -47.9115288318), (-20.9538238692, -48.5))
            ThreePointArc((-20.9538238692, -48.5), (-20.9653527009, -48.6170541932), (-20.9994961497, -48.7296100594))
            Line((-20.9994961497, -48.7296100594), (-19.2441250379, -49.4567085809))
            ThreePointArc((-19.2441250379, -49.4567085809), (-19.1018606682, -48.987725805), (-19.0538238692, -48.5))
        make_face()
    extrude(amount=-F3_DEPTH, mode=Mode.SUBTRACT)


solid = f1.part
